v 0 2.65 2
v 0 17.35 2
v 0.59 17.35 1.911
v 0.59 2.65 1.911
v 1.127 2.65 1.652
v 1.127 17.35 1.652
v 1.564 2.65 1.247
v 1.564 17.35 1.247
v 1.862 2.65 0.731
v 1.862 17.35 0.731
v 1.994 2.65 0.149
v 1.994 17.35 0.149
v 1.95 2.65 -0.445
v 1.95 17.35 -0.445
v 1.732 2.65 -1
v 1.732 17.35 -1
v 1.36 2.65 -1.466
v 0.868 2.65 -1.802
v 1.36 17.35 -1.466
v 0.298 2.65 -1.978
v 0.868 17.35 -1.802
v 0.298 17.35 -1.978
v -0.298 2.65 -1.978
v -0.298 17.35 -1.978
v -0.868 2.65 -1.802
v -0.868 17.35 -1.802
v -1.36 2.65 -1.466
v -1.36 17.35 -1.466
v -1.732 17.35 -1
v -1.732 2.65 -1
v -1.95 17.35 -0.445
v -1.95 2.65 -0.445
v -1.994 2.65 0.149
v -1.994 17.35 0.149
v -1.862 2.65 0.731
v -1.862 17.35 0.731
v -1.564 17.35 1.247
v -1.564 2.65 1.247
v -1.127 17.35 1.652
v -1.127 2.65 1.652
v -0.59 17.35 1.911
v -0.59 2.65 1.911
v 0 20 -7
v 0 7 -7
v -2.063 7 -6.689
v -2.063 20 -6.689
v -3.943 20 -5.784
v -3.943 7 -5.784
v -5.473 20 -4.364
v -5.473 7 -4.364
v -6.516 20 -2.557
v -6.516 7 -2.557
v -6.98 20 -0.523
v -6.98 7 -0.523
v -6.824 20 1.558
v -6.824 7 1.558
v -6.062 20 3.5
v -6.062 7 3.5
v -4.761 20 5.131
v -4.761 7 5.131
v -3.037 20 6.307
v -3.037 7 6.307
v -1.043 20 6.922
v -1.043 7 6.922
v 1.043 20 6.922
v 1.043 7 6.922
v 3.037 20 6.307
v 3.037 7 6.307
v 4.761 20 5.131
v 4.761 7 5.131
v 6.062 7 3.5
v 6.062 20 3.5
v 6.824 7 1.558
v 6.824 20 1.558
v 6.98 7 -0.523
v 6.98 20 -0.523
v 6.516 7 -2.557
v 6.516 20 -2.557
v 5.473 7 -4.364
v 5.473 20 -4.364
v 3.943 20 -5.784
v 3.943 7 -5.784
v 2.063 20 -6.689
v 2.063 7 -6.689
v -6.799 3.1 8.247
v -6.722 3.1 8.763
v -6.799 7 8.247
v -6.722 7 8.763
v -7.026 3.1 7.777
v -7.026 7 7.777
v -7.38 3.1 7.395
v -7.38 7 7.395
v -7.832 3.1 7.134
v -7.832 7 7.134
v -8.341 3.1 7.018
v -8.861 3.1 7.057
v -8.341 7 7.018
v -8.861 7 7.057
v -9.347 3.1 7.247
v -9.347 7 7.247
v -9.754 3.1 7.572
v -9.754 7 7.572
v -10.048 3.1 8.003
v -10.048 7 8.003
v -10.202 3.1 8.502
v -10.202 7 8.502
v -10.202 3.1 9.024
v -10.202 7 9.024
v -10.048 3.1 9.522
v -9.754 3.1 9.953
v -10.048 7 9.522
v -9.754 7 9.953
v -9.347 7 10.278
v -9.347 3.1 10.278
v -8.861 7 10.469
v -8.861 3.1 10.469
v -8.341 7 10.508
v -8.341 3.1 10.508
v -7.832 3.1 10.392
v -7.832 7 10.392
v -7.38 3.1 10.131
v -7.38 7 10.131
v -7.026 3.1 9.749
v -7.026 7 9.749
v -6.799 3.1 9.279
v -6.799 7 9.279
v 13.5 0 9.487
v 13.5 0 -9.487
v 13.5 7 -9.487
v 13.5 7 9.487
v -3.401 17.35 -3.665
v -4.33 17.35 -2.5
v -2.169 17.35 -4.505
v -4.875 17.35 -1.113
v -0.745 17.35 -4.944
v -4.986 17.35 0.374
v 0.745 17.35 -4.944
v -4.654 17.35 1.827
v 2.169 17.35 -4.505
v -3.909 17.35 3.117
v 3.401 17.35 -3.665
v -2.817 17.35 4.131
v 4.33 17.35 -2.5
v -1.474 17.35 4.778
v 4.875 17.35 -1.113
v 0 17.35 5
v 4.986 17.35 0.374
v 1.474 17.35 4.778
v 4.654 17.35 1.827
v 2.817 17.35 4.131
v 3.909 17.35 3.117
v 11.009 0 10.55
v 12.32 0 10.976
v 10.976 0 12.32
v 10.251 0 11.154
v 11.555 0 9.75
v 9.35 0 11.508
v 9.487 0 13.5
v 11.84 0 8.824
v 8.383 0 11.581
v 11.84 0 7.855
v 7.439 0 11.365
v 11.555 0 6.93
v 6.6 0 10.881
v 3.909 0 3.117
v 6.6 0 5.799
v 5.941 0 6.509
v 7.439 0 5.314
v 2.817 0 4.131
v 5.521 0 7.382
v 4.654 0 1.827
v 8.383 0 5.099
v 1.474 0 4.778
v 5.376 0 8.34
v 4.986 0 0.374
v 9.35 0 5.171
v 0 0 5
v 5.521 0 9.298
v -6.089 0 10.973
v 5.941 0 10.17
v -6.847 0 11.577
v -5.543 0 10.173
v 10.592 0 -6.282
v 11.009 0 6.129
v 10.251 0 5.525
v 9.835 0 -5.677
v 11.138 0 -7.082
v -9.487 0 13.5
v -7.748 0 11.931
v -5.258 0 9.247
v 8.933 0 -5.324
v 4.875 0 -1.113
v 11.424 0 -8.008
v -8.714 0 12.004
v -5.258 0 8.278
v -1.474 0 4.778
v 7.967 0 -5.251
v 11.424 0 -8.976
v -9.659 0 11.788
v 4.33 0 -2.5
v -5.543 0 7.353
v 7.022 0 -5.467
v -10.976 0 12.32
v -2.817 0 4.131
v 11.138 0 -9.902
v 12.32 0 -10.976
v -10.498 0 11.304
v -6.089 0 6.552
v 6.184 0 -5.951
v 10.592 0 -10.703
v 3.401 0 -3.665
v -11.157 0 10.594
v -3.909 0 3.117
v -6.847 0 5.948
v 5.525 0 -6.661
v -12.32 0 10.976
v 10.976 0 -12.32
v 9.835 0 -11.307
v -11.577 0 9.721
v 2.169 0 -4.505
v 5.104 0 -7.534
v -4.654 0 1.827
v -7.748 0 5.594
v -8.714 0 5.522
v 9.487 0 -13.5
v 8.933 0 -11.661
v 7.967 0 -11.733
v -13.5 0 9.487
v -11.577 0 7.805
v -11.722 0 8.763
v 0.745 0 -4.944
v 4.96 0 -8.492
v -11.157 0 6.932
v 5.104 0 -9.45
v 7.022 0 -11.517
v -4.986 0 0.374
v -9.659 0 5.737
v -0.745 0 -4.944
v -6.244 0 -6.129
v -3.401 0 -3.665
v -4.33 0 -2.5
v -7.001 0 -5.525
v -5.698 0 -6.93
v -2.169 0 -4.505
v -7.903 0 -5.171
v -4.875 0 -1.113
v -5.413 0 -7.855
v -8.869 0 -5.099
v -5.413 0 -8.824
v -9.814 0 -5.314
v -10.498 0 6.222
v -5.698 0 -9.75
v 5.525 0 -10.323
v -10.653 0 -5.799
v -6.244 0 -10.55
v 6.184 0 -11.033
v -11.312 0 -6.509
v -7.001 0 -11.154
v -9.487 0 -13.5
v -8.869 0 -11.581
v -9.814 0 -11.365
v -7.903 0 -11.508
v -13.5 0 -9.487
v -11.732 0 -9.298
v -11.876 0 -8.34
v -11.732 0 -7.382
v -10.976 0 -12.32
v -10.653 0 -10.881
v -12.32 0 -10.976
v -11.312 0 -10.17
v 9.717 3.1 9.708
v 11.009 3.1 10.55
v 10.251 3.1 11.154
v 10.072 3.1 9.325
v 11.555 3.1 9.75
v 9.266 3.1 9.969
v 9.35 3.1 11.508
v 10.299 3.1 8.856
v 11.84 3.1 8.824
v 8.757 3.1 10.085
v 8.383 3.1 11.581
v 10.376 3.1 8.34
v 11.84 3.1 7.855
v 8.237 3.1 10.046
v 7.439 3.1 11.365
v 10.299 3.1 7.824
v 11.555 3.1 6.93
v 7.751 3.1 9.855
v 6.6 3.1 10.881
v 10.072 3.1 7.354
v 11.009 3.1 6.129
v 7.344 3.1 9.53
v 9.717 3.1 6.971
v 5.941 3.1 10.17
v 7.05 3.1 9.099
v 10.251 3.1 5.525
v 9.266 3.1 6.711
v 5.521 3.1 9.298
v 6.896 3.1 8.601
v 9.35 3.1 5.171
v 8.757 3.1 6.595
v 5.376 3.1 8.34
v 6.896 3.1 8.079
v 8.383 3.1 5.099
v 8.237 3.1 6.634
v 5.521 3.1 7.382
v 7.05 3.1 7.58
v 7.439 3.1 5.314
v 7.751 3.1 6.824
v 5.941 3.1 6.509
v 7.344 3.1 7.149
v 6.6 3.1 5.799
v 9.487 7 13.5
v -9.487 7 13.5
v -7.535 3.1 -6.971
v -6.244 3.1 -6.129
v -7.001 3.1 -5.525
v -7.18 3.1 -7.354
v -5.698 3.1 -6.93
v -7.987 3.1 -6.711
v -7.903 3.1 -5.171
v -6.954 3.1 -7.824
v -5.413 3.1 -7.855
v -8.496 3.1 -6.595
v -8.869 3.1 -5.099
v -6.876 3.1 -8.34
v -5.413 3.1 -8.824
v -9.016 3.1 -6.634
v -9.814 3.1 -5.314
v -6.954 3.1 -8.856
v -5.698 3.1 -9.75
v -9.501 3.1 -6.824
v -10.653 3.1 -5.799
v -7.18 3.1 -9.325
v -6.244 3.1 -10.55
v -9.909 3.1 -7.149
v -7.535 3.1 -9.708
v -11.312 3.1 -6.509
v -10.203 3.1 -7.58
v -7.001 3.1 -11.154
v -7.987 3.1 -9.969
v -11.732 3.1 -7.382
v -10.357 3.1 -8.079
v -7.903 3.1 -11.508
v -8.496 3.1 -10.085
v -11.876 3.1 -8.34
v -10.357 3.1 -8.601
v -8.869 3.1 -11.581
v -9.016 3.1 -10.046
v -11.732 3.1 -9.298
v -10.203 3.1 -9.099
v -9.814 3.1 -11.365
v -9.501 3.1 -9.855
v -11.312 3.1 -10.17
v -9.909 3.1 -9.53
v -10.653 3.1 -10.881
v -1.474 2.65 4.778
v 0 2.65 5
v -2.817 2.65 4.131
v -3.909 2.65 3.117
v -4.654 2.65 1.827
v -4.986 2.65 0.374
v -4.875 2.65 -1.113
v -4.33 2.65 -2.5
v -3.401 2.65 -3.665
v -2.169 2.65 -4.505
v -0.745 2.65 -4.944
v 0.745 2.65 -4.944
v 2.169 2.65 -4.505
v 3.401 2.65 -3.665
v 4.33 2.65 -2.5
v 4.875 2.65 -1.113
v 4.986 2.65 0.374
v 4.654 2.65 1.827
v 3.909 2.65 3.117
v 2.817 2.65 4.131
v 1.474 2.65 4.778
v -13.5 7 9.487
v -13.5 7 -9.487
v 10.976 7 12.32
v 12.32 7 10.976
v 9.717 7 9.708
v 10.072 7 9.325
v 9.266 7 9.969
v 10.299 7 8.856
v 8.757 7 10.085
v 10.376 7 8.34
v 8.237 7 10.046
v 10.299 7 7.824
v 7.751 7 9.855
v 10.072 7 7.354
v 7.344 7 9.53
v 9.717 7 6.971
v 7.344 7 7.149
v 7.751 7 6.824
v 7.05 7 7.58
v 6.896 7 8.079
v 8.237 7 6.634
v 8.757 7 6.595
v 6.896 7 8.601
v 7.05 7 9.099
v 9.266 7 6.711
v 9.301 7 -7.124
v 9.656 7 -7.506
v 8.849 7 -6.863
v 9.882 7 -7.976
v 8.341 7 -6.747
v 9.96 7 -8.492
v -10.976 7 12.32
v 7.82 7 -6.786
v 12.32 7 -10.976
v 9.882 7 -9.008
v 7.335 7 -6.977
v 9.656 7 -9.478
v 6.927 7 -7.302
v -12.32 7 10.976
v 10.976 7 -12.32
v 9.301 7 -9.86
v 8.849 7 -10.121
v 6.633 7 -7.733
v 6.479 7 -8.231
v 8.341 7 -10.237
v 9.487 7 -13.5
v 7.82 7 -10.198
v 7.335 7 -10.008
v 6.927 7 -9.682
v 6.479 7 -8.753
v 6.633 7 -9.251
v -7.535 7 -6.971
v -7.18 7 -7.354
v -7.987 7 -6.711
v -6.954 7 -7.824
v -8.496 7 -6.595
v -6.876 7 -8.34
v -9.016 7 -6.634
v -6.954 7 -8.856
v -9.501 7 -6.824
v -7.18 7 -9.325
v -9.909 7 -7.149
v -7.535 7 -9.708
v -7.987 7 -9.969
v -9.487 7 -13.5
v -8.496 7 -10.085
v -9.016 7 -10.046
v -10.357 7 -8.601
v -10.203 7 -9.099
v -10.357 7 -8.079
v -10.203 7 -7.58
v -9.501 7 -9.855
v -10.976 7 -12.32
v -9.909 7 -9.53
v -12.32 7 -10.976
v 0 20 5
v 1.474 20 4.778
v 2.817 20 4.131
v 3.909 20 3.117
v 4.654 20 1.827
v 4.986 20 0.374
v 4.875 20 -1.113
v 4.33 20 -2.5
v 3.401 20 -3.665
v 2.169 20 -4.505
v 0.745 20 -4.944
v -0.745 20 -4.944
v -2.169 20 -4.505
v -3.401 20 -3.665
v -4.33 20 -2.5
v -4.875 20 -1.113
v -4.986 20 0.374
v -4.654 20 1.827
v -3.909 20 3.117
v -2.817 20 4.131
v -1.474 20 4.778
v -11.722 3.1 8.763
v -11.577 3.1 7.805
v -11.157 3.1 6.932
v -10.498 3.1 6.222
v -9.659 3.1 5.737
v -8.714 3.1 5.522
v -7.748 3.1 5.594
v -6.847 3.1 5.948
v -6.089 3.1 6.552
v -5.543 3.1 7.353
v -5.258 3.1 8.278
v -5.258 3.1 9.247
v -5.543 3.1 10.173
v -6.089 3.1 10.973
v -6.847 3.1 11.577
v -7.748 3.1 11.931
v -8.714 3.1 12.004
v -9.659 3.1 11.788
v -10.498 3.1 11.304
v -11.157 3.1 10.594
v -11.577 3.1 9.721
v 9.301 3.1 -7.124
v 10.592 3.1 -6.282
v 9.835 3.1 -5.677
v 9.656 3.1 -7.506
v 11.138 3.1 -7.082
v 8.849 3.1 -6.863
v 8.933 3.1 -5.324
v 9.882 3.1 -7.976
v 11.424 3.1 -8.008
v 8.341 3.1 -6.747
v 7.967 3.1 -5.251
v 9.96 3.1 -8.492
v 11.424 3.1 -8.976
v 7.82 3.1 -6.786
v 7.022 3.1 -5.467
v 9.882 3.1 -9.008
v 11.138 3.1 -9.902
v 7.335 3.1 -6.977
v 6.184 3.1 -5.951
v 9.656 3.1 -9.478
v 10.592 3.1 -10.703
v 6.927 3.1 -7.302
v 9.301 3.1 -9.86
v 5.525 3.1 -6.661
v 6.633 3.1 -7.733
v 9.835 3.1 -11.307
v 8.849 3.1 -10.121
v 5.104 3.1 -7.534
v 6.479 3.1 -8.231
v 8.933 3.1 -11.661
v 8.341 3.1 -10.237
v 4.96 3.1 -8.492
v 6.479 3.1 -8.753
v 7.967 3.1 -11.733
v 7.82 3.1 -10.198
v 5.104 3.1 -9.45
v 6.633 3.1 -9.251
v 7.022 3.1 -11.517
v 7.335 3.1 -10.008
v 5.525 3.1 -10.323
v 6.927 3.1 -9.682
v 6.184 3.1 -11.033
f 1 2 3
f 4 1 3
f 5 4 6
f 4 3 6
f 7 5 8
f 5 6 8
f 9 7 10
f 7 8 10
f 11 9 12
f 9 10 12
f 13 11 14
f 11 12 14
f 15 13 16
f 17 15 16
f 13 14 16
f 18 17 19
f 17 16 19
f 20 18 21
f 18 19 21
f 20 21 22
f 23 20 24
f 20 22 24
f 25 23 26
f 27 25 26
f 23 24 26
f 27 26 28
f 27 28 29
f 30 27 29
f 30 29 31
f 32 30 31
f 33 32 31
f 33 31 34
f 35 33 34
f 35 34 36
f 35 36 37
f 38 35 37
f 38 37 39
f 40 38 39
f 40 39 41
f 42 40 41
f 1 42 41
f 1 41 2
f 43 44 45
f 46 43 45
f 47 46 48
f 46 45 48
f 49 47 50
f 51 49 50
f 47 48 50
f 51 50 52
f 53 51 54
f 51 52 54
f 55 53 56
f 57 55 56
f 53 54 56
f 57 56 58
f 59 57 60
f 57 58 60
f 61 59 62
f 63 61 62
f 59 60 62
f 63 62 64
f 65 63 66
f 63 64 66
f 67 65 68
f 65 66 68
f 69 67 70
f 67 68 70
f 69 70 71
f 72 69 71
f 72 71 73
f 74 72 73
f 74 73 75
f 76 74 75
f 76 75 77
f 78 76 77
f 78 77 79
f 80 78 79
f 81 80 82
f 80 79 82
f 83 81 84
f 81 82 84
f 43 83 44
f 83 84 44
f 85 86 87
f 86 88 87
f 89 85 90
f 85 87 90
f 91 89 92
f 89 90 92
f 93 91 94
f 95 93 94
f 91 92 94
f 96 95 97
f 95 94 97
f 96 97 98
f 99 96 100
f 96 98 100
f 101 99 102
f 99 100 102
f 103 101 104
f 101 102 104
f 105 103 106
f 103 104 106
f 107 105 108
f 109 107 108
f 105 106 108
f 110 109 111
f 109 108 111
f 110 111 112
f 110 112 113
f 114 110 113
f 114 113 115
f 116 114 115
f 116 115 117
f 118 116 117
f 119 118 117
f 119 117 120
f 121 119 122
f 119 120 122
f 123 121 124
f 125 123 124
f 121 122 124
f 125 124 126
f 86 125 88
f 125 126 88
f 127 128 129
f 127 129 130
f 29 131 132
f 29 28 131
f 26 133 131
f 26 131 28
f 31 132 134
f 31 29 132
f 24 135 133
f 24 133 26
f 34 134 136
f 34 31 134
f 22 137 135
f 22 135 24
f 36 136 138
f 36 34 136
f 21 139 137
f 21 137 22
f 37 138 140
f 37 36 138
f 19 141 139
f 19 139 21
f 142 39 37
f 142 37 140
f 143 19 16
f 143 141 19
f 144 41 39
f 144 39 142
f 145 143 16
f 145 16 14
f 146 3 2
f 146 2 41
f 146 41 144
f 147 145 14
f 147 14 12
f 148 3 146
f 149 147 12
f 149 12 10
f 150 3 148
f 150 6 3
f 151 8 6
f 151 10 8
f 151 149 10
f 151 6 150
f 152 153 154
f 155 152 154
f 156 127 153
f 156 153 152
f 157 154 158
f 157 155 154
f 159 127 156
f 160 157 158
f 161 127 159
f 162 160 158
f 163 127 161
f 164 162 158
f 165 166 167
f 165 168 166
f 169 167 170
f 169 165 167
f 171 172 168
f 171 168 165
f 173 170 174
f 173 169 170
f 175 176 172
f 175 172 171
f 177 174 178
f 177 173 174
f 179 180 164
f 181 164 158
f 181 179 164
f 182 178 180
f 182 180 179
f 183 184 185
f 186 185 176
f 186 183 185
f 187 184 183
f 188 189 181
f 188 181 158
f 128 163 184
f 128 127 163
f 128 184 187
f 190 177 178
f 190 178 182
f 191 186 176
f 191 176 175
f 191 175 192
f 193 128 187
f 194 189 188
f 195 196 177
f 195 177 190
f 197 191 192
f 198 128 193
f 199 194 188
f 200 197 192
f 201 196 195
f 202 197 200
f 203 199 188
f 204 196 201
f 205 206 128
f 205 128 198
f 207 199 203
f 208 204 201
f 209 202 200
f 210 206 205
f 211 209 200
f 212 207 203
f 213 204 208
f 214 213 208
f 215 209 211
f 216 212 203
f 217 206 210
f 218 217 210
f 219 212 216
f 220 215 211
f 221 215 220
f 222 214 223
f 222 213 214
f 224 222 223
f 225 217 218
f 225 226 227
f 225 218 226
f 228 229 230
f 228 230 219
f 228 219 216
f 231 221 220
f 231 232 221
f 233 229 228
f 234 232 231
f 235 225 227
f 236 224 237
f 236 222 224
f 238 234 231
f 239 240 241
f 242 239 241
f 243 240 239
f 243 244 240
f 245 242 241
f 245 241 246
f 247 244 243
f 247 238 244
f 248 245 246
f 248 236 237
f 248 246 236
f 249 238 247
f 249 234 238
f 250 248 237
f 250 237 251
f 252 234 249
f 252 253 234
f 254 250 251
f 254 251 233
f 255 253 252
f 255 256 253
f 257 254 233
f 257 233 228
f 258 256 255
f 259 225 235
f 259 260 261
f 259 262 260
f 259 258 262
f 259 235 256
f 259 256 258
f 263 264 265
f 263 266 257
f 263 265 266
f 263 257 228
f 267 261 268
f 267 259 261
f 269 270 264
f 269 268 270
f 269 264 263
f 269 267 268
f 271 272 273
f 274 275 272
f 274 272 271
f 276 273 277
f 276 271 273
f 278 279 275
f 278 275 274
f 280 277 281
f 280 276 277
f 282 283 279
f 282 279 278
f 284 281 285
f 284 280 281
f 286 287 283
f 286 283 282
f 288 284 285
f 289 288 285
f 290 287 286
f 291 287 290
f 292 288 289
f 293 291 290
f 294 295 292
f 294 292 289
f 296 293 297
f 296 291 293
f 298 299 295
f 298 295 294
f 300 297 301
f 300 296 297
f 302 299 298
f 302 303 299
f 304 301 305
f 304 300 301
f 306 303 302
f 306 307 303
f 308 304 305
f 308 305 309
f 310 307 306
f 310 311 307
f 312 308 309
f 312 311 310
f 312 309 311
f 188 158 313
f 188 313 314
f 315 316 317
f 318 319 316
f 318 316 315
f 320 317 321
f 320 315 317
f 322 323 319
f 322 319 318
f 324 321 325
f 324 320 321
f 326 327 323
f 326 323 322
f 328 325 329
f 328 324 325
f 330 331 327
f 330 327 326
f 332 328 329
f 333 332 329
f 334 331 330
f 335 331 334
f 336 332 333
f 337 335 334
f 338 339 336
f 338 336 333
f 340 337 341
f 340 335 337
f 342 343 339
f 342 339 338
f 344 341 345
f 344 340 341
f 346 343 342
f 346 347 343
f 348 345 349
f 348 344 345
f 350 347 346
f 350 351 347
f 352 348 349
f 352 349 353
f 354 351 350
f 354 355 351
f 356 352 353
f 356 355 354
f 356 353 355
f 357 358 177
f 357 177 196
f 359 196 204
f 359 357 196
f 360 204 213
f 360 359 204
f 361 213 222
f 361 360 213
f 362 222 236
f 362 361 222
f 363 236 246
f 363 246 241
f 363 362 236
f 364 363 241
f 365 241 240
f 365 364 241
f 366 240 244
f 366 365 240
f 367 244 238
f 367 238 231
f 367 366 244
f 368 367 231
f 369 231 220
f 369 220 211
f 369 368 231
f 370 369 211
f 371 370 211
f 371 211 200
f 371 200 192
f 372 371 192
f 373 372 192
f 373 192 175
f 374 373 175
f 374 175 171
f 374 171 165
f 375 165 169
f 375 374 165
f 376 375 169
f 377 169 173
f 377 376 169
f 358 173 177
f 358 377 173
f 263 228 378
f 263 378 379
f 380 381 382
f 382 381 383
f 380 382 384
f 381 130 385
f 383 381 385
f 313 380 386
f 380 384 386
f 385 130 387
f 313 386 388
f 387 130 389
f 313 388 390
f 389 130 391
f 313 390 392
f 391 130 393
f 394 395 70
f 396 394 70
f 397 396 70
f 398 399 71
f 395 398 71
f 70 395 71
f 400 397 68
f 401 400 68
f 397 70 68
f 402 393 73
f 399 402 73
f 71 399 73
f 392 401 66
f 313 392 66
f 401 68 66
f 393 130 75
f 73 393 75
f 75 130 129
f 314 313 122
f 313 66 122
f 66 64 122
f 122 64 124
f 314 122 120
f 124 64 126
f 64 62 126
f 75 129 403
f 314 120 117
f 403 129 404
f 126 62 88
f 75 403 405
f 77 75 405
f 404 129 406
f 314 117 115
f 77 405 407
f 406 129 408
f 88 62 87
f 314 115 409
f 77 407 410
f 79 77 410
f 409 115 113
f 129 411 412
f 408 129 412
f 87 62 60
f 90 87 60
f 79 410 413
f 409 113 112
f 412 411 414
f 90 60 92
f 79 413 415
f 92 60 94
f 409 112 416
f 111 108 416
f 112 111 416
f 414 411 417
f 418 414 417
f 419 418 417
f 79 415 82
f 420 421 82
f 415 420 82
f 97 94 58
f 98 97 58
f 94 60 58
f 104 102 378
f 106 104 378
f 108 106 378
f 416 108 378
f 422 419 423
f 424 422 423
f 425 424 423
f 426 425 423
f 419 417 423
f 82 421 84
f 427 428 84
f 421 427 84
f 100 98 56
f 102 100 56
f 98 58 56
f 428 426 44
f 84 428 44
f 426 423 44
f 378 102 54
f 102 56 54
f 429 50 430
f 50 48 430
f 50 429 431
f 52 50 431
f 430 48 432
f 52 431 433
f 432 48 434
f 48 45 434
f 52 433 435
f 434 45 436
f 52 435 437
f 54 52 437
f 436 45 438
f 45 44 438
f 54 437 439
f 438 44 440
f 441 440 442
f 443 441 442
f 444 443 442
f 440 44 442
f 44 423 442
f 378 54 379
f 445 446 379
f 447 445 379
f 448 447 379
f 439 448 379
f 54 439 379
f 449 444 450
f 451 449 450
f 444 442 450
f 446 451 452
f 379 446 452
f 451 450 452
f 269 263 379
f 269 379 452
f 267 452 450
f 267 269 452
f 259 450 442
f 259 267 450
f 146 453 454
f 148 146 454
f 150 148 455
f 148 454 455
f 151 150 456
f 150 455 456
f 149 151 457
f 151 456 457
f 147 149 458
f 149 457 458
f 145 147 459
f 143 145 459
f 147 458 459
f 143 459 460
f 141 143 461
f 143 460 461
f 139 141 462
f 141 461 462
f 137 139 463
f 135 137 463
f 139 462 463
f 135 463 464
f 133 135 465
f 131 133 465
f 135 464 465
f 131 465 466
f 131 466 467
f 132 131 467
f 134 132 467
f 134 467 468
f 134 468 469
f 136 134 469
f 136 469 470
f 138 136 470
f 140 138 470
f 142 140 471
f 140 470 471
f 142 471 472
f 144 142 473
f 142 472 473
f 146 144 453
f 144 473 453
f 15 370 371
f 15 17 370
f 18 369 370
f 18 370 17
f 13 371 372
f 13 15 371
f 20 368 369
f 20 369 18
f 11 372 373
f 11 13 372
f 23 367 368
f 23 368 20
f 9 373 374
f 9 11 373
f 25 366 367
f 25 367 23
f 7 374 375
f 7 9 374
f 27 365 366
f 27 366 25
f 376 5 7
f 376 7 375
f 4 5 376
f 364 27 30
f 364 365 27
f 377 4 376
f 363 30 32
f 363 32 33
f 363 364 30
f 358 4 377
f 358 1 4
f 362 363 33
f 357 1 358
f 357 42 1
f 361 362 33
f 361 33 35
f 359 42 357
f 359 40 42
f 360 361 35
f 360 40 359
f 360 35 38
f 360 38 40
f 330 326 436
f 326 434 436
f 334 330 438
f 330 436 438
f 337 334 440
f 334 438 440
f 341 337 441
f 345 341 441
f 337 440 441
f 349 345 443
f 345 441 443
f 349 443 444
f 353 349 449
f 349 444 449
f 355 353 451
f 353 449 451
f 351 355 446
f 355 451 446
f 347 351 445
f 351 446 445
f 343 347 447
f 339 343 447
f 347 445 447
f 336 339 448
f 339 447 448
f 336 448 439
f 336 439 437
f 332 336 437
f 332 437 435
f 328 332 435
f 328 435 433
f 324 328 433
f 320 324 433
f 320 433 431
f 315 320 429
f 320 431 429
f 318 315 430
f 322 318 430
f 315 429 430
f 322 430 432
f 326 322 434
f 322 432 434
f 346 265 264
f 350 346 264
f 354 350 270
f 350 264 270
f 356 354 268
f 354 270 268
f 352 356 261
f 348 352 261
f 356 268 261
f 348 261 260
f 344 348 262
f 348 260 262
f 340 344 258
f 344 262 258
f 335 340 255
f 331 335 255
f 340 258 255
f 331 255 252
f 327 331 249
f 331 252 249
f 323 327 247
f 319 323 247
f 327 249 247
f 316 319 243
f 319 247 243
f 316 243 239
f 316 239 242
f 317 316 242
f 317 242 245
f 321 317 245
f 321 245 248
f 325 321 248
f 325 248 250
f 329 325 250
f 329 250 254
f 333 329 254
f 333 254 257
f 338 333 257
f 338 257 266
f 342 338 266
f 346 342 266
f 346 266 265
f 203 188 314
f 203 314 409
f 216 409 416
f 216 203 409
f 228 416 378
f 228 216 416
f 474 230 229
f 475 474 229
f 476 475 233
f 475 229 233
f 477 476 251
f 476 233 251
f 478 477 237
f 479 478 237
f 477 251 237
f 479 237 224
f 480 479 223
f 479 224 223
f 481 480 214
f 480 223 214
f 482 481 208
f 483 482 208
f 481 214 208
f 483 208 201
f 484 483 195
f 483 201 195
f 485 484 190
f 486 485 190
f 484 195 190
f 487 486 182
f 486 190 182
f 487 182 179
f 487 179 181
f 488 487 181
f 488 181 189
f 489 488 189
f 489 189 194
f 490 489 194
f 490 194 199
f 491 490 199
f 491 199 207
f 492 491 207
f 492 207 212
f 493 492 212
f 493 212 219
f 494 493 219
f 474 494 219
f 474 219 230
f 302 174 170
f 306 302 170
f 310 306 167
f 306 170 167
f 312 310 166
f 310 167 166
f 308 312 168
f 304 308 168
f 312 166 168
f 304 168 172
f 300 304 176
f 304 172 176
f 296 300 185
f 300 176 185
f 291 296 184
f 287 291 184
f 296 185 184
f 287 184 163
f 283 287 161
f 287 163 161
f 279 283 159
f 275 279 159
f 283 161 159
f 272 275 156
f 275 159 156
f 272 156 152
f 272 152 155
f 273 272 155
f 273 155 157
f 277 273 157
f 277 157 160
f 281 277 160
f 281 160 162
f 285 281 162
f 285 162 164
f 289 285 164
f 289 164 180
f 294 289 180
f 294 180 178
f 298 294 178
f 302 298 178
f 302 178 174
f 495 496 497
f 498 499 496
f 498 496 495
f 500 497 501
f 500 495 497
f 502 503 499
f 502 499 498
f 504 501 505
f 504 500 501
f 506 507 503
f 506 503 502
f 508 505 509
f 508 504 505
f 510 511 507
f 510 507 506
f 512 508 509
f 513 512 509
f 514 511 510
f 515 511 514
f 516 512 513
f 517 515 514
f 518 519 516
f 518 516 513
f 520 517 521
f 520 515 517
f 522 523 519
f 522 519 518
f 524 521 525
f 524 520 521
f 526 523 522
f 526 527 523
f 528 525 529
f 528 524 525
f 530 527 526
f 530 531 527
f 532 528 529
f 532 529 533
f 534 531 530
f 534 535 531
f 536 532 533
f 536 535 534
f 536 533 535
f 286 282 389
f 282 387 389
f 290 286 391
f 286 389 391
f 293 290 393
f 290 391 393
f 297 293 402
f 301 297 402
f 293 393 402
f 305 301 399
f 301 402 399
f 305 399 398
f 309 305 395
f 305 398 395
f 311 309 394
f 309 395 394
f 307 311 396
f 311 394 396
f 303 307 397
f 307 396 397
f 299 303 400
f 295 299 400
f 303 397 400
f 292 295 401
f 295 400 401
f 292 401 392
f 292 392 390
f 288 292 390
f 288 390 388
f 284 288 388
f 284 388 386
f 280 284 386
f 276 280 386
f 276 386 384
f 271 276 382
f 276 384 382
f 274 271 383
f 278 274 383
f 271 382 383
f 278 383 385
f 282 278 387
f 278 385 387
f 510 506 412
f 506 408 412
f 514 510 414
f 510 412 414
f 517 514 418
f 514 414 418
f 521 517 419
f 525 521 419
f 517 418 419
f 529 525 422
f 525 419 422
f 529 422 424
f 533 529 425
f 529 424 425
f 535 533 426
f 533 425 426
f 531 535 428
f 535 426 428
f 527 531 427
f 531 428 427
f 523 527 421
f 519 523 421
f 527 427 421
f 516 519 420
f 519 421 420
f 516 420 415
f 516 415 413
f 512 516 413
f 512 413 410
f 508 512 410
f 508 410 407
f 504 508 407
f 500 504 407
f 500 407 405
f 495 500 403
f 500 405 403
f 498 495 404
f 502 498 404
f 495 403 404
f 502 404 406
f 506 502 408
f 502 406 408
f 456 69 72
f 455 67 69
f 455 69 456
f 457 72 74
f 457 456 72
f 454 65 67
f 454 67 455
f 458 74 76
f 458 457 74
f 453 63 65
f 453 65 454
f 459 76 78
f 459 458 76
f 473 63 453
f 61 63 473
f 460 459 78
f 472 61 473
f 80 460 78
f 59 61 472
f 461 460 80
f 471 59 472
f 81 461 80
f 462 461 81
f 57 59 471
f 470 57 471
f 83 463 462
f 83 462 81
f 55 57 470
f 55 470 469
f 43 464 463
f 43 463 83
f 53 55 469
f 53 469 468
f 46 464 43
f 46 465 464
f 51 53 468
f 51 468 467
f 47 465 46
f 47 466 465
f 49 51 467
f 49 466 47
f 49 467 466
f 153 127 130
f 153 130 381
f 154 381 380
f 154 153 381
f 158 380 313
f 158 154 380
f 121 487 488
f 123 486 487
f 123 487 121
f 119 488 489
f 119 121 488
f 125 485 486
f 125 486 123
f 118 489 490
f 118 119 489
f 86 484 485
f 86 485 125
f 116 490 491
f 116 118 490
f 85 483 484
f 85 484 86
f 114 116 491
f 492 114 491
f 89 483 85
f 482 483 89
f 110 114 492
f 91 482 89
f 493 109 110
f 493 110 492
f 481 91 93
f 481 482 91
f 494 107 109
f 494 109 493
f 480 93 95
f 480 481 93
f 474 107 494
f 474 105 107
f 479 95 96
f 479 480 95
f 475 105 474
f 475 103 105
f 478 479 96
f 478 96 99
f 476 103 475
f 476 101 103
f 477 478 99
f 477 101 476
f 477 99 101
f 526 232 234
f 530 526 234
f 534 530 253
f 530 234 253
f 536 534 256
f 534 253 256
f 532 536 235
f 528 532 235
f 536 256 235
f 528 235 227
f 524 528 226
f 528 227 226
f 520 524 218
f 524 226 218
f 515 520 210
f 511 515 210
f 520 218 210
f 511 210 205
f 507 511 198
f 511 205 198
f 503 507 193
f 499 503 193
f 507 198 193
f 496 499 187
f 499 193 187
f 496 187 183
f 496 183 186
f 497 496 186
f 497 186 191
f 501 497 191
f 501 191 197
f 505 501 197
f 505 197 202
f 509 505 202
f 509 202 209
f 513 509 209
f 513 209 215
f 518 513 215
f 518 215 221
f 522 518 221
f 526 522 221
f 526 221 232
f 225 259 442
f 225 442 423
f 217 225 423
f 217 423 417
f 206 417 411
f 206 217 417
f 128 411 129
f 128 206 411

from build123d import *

# Parameters (mm, degrees)
EXTRUDE_1_DEPTH           = 7
SKETCH_6_R                = 7
EXTRUDE_5_DEPTH           = 13
SKETCH_8_R                = 2
CUT_EXTRUDE_2_DEPTH       = 30
SKETCH_9_R                = 5
CUT_EXTRUDE_3_DEPTH       = 2.65
CUT_EXTRUDE_START         = -2.65
SKETCH_10_R               = 5
CUT_EXTRUDE_4_DEPTH       = 2.65
HOLE_WIZARD_2_D           = 3.5
HOLE_WIZARD_2_DEPTH       = 20
HOLE_WIZARD_2_CBORE_D     = 6.5
HOLE_WIZARD_2_CBORE_DEPTH = 3.1
HOLE_WIZARD_2_TIP         = 1.051506083


with BuildPart() as part:
    # 草图1 → 凸台-拉伸1 (new body)
    with BuildSketch(Plane(origin=(0, 0, 0), x_dir=(1, 0, 0), z_dir=(0, 1, 0))):
        with BuildLine():
            Line((9.486832981, -13.5), (-9.486832981, -13.5))
            ThreePointArc((-9.486832981, -13.5), (-11.66726189, -11.66726189), (-13.5, -9.486832981))
            Line((-13.5, -9.486832981), (-13.5, 9.486832981))
            ThreePointArc((-13.5, 9.486832981), (-11.66726189, 11.66726189), (-9.486832981, 13.5))
            Line((-9.486832981, 13.5), (9.486832981, 13.5))
            ThreePointArc((9.486832981, 13.5), (11.66726189, 11.66726189), (13.5, 9.486832981))
            Line((13.5, 9.486832981), (13.5, -9.486832981))
            ThreePointArc((13.5, -9.486832981), (11.66726189, -11.66726189), (9.486832981, -13.5))
        make_face()
    extrude(amount=EXTRUDE_1_DEPTH)

    # 草图6 → 凸台-拉伸5 (add)
    with BuildSketch(Plane(origin=(0, 7, 0), x_dir=(1, 0, 0), z_dir=(0, 1, 0))):
        with Locations(Location((0, 0, 0), (0, 0, 90))):
            Circle(SKETCH_6_R)
    extrude(amount=EXTRUDE_5_DEPTH)

    # 草图8 → 切除-拉伸2 (cut)
    with BuildSketch(Plane(origin=(0, 20, 0), x_dir=(1, 0, 0), z_dir=(0, 1, 0))):
        with Locations(Location((0, 0, 0), (0, 0, 270))):
            Circle(SKETCH_8_R)
    extrude(amount=-CUT_EXTRUDE_2_DEPTH, mode=Mode.SUBTRACT)

    # 草图9 → 切除-拉伸3 (cut)
    with BuildSketch(Plane(origin=(0, 20, 0), x_dir=(1, 0, 0), z_dir=(0, 1, 0))):
        with Locations(Location((0, 0, 0), (0, 0, 270))):
            Circle(SKETCH_9_R)
    extrude(amount=-CUT_EXTRUDE_3_DEPTH, mode=Mode.SUBTRACT)

    # 草图10 → 切除-拉伸4 (cut)
    with BuildSketch(Plane.XZ.offset(CUT_EXTRUDE_START)):
        with Locations(Location((0, 0, 0), (0, 0, 90))):
            Circle(SKETCH_10_R)
    extrude(amount=CUT_EXTRUDE_4_DEPTH, mode=Mode.SUBTRACT)

    # 孔2
    with Locations(Plane(origin=(0, 0, 0), x_dir=(-1, 0, 0), z_dir=(0, -1, 0))):
        with Locations((-8.209852454, 8.492066132), (8.626364404, 8.339687642), (8.471576116, -8.762786544), (-8.626364404, -8.339687642)):
            CounterBoreHole(HOLE_WIZARD_2_D / 2, HOLE_WIZARD_2_CBORE_D / 2, HOLE_WIZARD_2_CBORE_DEPTH, depth=HOLE_WIZARD_2_DEPTH)
            with Locations((0, 0, -(HOLE_WIZARD_2_DEPTH + HOLE_WIZARD_2_TIP / 2))):  # 118° drill point
                Cone(0, HOLE_WIZARD_2_D / 2, HOLE_WIZARD_2_TIP, mode=Mode.SUBTRACT)


solid = part.part
